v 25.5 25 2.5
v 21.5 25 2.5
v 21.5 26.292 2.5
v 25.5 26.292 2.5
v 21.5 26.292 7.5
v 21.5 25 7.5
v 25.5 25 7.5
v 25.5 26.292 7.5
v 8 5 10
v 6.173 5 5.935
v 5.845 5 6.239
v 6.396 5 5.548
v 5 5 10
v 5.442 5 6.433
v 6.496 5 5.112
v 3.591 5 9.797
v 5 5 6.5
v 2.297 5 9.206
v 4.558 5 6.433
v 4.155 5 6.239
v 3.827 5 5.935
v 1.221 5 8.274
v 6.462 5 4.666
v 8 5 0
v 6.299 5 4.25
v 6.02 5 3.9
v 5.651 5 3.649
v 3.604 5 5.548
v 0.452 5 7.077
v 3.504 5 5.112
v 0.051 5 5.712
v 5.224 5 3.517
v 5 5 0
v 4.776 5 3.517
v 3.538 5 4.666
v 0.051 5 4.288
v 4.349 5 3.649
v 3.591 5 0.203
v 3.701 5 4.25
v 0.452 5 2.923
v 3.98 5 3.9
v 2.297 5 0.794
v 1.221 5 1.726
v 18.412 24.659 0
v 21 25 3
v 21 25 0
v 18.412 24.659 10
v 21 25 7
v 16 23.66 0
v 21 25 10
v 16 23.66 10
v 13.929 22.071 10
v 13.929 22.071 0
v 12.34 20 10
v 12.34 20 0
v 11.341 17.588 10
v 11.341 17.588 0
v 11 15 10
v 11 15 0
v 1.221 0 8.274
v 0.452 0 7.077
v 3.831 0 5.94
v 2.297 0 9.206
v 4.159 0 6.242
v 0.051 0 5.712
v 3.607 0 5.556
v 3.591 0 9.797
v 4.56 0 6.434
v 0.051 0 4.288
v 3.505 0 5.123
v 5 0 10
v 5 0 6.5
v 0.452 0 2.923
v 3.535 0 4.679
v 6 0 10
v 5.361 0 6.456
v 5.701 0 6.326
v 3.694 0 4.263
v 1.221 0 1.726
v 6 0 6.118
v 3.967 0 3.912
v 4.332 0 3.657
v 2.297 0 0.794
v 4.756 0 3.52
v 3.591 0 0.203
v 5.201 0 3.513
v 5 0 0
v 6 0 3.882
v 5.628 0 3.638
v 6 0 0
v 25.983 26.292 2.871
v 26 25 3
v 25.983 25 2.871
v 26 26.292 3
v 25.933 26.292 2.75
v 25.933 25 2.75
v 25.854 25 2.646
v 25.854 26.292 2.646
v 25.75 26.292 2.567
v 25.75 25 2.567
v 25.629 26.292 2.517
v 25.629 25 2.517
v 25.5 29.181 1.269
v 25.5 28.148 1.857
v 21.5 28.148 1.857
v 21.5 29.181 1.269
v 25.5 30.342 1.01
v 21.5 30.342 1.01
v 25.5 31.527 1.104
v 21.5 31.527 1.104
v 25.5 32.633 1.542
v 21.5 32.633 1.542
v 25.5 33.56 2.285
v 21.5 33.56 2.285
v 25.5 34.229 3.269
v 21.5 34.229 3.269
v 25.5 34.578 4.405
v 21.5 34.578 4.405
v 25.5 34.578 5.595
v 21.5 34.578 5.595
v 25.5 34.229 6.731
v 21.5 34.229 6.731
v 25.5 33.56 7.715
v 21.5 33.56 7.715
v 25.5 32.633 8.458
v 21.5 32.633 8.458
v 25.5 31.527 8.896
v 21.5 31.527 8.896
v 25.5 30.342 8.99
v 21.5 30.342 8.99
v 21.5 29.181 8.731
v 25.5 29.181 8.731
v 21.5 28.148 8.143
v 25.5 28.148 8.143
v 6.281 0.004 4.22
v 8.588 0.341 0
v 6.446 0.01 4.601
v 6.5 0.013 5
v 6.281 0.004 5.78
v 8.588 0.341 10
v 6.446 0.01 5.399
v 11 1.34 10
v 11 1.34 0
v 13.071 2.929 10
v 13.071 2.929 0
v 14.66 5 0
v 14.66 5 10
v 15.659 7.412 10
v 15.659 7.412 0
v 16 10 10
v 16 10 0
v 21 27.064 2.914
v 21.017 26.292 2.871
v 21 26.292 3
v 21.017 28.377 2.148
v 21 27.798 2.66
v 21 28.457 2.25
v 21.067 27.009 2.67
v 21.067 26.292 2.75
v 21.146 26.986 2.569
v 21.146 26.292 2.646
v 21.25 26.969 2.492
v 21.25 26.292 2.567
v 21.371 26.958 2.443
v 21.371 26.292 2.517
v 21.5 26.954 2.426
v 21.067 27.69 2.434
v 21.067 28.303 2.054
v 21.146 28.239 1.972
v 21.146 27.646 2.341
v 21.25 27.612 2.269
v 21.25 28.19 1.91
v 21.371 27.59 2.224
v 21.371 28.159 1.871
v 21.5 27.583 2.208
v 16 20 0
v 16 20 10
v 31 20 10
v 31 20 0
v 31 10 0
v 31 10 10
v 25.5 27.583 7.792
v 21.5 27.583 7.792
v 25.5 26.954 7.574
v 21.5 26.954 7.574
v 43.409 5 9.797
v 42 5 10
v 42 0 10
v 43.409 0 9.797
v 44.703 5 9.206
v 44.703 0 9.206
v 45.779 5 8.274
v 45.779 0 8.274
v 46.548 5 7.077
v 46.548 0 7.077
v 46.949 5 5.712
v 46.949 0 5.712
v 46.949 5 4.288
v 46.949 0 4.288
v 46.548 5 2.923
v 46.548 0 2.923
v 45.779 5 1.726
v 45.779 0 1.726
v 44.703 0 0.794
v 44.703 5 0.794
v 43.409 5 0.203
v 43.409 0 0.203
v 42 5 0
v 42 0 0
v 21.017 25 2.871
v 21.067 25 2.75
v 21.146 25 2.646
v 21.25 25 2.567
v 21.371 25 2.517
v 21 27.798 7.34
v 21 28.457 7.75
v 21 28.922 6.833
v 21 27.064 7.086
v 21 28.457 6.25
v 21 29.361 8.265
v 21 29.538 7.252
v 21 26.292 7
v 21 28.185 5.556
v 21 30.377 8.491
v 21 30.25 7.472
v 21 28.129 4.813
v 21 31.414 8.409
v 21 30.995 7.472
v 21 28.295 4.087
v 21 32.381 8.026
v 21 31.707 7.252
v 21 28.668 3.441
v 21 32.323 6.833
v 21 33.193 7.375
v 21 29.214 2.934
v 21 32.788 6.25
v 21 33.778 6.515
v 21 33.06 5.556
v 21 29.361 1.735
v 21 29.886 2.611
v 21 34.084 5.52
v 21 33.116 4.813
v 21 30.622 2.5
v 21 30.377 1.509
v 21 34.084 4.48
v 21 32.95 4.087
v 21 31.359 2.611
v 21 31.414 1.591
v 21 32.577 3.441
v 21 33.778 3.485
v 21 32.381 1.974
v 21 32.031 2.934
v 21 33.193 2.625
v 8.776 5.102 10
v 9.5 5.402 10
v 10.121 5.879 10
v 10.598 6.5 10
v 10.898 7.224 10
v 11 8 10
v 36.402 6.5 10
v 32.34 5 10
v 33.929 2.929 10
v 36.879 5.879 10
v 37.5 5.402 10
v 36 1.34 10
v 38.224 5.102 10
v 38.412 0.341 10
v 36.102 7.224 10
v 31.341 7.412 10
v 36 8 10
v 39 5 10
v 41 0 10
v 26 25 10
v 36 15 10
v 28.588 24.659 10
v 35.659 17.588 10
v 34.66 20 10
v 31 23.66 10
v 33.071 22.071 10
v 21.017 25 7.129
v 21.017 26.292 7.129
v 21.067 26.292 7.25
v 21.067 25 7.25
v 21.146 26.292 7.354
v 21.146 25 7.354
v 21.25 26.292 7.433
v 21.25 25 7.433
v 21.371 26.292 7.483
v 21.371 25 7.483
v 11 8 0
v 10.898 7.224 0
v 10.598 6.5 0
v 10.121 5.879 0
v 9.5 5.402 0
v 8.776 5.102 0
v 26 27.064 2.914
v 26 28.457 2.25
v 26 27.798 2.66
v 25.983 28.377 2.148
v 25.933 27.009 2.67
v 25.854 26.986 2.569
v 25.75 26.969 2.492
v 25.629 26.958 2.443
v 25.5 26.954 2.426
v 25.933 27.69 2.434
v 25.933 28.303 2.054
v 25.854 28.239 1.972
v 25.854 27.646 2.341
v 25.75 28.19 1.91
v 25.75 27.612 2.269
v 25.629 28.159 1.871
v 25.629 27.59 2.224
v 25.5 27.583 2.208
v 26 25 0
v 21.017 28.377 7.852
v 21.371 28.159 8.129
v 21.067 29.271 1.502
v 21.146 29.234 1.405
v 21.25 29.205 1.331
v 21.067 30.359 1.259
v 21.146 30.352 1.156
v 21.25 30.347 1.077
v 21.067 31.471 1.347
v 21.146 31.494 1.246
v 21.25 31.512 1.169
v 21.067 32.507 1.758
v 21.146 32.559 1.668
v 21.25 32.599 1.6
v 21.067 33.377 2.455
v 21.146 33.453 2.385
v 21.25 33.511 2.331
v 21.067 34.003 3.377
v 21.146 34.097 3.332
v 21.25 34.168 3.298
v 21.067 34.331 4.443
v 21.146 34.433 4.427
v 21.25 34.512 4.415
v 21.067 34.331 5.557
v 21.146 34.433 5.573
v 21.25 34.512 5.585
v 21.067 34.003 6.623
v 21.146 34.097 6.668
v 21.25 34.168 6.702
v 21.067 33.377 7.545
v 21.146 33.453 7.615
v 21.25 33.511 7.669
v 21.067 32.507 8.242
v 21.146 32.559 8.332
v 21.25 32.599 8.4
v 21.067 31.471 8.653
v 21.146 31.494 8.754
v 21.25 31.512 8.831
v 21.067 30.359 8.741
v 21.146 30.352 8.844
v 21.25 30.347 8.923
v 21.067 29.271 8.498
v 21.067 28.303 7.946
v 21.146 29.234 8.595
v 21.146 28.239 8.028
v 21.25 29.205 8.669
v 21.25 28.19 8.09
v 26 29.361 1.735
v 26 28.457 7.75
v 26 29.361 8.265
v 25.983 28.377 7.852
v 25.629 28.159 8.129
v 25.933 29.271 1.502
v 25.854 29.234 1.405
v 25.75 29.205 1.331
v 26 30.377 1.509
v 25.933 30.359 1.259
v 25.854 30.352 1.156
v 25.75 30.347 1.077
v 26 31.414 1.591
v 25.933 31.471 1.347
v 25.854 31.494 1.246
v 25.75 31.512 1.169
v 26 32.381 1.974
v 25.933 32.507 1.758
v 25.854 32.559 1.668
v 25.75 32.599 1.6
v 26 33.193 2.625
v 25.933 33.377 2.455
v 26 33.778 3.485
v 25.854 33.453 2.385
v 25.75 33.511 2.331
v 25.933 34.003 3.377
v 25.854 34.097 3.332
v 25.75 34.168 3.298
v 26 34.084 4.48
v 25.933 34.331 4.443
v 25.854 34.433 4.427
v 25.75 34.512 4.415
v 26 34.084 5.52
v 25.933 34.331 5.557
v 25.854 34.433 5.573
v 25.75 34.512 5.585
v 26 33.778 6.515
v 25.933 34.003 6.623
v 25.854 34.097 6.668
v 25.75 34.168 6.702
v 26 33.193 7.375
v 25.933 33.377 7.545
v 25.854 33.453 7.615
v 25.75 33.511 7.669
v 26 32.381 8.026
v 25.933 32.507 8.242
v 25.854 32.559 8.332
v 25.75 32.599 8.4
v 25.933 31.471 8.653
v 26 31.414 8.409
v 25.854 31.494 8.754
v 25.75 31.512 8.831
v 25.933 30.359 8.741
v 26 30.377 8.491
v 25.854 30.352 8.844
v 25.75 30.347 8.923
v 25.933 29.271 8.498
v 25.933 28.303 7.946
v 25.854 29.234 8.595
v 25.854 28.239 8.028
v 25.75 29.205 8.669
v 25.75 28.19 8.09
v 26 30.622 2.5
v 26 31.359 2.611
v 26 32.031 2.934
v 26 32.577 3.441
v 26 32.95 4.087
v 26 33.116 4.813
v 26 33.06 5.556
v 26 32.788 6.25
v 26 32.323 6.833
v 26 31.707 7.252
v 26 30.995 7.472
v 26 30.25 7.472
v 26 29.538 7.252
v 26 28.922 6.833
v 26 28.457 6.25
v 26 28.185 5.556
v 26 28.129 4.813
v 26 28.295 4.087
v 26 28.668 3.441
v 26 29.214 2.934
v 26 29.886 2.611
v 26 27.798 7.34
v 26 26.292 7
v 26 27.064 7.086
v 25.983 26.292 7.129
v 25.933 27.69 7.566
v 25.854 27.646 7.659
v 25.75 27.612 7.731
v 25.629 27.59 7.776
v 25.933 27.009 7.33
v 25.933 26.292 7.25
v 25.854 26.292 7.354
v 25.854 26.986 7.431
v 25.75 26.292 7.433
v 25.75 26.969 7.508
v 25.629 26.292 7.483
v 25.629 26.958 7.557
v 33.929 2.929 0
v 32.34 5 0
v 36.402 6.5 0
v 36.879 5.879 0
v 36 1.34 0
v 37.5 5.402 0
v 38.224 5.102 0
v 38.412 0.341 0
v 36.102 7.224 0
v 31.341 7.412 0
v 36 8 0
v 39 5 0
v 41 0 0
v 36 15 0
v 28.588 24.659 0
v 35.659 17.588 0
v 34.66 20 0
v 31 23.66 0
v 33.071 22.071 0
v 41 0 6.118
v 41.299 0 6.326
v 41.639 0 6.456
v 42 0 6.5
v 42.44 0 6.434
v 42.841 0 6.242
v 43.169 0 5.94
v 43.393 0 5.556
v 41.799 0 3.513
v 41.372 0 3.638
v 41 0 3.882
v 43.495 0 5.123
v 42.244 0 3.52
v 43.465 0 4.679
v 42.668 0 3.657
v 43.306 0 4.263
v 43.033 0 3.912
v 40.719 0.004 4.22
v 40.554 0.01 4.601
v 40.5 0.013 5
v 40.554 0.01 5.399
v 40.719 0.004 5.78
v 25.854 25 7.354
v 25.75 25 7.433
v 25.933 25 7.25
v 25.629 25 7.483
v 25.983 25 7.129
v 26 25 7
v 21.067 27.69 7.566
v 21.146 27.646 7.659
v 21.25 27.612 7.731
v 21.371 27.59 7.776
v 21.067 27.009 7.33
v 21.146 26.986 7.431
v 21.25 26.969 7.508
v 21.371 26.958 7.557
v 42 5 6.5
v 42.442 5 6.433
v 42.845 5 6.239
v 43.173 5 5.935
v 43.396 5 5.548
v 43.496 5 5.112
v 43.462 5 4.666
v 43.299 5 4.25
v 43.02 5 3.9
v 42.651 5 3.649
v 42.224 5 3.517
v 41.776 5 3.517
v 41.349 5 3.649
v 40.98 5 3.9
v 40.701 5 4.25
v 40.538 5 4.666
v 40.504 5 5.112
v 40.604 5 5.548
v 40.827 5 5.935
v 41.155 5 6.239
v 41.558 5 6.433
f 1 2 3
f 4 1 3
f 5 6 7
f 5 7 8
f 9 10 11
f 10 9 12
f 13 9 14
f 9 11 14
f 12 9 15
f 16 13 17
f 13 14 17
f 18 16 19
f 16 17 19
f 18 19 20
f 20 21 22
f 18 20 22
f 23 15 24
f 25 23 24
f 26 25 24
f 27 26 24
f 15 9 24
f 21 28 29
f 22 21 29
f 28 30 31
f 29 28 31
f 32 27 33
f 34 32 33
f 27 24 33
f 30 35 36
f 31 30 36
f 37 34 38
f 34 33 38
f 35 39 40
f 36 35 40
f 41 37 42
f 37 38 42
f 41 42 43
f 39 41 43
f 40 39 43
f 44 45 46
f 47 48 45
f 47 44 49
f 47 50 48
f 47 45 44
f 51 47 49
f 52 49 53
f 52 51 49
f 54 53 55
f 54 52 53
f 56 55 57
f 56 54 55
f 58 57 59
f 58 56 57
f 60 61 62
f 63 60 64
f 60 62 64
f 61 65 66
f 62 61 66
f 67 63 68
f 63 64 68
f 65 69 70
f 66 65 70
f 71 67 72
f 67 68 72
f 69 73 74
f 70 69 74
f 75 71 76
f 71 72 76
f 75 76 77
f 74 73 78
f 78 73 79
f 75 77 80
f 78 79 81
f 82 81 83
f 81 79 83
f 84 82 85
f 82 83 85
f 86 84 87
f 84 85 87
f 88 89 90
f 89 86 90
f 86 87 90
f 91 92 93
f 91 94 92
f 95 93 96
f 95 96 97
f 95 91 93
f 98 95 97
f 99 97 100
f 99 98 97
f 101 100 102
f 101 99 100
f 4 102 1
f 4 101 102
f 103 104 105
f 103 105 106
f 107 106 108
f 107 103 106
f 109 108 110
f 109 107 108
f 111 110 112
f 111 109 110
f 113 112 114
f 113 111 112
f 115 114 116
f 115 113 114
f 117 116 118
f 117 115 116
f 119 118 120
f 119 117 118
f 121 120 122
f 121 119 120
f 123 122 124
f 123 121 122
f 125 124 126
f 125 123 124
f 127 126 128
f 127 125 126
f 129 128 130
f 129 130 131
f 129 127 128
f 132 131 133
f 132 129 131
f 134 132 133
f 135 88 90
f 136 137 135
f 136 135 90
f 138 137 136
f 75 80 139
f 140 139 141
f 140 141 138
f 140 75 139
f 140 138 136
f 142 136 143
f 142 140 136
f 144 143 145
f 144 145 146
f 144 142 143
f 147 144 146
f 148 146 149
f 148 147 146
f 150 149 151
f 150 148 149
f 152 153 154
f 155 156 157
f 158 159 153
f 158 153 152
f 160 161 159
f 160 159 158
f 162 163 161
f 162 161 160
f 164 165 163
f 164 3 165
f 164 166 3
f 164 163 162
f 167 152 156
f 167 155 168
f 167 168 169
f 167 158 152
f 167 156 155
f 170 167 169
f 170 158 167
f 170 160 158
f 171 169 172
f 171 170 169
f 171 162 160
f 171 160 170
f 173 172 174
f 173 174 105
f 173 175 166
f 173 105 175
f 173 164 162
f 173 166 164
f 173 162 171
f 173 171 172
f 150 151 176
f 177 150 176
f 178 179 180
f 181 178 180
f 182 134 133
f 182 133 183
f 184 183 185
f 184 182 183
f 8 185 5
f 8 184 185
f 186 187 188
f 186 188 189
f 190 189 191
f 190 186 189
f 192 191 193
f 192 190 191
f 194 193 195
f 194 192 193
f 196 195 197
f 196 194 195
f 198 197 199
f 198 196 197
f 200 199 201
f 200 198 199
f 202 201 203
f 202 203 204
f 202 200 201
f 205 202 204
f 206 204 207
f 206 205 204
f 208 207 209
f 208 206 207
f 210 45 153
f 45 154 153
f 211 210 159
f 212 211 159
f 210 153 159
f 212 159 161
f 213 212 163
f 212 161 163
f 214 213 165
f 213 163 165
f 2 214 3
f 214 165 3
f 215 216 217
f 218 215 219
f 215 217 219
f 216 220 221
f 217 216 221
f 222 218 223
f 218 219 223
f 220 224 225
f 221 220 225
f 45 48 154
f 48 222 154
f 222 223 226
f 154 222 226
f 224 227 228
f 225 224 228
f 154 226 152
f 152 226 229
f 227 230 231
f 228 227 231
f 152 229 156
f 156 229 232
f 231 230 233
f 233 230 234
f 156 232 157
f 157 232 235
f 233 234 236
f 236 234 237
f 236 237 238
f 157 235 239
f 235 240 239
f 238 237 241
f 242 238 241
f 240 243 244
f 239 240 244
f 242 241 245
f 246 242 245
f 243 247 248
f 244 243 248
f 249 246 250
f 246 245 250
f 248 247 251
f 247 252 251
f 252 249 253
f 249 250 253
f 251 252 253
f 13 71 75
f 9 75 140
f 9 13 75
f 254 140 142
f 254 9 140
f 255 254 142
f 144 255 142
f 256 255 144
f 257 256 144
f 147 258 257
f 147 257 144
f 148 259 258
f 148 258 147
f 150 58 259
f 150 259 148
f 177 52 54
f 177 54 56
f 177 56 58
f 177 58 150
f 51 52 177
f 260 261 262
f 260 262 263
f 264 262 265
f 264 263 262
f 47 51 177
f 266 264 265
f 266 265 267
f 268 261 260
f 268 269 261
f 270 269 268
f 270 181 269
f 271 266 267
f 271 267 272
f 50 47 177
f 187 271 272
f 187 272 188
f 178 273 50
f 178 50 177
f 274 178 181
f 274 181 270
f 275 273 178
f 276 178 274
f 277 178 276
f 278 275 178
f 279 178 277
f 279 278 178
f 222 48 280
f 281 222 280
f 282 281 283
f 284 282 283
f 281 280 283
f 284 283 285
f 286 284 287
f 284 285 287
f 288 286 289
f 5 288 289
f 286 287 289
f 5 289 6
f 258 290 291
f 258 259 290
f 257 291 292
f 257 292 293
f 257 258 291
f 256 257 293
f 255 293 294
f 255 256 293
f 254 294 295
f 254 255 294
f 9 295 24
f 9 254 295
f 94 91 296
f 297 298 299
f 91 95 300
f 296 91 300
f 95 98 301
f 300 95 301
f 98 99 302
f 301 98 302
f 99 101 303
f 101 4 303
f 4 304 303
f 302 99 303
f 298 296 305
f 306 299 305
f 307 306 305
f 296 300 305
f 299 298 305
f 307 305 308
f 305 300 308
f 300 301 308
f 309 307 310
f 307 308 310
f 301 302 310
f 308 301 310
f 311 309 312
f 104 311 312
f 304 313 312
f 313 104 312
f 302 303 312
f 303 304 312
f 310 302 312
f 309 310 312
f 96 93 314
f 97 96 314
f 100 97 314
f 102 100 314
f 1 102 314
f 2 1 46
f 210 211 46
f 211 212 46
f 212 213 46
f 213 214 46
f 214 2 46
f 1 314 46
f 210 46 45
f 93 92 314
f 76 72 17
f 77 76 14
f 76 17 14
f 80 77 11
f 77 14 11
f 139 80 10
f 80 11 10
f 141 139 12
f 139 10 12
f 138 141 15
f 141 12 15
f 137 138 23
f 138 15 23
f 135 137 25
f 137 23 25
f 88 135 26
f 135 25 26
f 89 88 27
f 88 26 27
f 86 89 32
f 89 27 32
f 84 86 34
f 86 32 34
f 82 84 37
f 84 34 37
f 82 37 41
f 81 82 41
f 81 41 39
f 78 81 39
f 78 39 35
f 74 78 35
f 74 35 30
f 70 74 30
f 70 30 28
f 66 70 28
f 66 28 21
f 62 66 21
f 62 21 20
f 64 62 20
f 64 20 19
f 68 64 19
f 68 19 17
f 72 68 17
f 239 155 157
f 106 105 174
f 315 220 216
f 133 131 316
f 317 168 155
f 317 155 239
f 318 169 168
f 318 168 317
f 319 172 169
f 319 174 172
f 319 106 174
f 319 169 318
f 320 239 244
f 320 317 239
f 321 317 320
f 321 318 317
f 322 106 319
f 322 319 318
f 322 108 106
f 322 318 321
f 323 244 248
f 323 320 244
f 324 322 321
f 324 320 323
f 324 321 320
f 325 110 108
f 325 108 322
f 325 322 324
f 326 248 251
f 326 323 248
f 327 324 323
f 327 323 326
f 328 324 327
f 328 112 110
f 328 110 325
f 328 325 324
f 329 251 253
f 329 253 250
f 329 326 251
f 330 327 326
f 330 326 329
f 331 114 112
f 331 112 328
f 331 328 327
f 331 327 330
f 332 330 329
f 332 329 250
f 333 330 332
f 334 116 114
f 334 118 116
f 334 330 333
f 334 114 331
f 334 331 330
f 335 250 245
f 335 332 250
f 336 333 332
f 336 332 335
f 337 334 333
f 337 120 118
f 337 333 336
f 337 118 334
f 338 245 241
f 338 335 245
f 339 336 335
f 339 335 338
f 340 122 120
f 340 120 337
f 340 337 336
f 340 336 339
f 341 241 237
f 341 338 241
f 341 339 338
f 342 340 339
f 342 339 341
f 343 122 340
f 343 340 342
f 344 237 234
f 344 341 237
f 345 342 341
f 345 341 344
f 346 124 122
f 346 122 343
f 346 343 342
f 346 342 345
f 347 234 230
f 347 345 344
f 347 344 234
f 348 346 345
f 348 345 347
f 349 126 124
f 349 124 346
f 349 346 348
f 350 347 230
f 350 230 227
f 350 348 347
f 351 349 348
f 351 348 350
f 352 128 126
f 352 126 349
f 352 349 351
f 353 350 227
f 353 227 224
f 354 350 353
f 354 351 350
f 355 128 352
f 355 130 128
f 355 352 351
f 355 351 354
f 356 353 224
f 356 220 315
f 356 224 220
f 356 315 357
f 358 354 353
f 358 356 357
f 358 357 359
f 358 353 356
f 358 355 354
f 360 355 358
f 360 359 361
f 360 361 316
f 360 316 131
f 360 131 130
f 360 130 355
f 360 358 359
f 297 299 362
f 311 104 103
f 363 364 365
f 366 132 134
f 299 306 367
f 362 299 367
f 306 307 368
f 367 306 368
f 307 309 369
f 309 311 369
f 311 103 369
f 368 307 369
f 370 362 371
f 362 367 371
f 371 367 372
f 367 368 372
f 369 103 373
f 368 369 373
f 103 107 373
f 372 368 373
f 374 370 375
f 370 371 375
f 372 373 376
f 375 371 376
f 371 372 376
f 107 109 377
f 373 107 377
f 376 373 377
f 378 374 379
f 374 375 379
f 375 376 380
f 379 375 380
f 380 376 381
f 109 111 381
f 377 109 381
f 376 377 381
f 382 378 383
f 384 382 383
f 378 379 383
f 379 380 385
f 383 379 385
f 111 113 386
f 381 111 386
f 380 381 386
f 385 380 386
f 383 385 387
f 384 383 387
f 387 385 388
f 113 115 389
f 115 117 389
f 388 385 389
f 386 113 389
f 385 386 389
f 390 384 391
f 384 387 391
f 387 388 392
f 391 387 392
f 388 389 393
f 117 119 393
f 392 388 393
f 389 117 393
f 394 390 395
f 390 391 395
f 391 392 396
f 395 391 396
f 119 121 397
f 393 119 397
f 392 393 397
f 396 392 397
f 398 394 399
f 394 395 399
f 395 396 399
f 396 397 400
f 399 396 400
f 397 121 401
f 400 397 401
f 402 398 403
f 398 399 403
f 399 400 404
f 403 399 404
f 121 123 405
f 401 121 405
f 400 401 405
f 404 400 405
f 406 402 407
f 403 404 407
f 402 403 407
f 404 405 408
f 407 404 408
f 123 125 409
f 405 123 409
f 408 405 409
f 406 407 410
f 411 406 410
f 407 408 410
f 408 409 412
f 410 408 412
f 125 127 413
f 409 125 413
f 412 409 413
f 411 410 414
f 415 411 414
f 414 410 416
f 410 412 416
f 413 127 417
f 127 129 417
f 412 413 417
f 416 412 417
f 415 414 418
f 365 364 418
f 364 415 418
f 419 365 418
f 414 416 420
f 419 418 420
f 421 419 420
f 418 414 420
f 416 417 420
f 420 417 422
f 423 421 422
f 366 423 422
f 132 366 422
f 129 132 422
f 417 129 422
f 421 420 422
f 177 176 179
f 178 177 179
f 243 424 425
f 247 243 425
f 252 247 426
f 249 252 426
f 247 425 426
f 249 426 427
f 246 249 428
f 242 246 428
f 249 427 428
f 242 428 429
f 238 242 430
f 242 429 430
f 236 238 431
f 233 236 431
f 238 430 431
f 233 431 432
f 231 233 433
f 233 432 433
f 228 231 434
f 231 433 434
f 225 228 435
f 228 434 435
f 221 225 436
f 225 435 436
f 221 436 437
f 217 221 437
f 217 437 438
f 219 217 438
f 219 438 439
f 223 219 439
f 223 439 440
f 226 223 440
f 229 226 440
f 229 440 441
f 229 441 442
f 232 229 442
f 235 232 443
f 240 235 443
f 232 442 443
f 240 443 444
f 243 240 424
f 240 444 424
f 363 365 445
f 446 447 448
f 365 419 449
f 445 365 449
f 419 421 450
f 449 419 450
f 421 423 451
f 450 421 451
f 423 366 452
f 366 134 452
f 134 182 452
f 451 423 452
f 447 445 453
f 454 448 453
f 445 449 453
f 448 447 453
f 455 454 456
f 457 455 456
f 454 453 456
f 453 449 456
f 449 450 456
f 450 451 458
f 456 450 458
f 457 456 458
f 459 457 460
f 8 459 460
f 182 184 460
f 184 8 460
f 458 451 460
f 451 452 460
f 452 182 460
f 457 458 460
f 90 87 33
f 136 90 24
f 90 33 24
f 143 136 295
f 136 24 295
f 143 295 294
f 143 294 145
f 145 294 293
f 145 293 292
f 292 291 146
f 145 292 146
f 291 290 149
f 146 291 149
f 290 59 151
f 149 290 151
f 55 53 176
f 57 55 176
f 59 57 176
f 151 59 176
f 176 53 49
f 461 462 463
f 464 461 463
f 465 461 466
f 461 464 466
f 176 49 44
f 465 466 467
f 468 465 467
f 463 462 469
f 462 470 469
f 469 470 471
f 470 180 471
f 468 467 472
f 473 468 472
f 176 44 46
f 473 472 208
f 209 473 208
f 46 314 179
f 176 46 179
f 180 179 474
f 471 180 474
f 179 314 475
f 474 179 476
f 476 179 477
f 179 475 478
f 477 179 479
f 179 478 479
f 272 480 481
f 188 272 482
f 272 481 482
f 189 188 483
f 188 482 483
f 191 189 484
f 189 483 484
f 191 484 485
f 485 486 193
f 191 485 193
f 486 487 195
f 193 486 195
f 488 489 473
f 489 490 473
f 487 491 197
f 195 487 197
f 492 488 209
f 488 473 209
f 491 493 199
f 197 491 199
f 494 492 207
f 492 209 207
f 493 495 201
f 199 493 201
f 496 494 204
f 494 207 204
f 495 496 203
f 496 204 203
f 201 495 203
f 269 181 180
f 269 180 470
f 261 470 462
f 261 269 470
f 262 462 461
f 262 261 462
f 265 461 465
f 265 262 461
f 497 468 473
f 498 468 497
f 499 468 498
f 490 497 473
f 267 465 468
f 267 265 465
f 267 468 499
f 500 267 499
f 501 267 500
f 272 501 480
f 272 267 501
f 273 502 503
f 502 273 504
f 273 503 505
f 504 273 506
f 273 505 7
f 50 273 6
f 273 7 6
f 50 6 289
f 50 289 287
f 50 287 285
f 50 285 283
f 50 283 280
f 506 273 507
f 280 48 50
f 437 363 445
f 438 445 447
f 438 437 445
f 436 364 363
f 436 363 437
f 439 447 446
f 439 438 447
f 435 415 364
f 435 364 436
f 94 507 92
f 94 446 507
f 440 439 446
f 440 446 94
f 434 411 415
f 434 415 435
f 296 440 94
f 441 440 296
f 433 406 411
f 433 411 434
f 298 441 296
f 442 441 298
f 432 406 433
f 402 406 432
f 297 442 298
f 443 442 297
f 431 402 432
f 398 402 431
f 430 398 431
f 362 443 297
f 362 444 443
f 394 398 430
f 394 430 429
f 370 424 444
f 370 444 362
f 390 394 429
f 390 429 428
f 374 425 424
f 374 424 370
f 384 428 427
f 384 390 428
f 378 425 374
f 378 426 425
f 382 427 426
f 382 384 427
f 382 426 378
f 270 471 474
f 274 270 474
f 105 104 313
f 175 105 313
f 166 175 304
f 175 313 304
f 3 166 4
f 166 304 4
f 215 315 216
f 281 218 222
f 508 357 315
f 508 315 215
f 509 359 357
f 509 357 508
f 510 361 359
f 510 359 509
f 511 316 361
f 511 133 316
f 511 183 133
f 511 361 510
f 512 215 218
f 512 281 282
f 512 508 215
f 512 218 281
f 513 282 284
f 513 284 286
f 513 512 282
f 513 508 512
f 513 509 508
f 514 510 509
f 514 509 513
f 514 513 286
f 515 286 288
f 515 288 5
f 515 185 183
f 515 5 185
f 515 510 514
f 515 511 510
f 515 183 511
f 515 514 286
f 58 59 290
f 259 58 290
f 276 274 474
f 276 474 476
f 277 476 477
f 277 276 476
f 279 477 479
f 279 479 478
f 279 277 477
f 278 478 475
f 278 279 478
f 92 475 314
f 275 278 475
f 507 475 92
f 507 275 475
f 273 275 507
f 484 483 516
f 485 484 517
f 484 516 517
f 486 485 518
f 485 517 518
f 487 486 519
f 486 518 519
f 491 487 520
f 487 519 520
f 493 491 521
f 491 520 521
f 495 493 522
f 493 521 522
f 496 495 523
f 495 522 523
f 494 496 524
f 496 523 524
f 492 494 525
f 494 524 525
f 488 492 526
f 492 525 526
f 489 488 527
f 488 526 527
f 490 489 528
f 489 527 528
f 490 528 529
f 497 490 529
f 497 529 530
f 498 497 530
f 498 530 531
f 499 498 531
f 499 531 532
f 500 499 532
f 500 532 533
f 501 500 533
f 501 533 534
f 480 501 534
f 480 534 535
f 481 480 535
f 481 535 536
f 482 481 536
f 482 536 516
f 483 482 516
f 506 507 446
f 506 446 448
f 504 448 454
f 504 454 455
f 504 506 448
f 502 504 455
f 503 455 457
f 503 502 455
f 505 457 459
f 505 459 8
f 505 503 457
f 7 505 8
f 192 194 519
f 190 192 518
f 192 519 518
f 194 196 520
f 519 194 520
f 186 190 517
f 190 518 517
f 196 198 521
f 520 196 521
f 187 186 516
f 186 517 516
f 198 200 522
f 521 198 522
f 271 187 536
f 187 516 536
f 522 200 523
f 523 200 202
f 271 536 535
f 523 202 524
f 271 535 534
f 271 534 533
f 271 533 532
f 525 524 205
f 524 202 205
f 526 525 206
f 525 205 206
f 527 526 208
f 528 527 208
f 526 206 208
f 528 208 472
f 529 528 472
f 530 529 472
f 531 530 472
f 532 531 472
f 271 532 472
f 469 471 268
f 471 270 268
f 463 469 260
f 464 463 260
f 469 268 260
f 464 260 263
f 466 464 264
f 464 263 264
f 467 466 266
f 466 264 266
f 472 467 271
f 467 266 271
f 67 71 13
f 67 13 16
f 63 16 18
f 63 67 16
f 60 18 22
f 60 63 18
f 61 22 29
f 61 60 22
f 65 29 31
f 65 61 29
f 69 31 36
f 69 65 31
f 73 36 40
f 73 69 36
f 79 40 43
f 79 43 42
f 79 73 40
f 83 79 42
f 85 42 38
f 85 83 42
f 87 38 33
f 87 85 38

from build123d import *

# Parameters (mm, degrees)
BOSS_EXTRU_1_DEPTH      = 10
CONG_1_RADIUS           = 5
CONG_1_LENGTH           = 5
CONG_2_RADIUS           = 5
CONG_2_LENGTH           = 5
CONG_3_R                = 10
CONG_4_R                = 10
CONG_6_R                = 3
CONG_7_R                = 3
ESQUISSE2_R             = 1.5
ENL_V_MAT_EXTRU_1_DEPTH = 10
BOSS_EXTRU_2_START      = 21
ESQUISSE3_W             = 5
ESQUISSE3_H             = 2.5
BOSS_EXTRU_2_DEPTH      = 5
ESQUISSE5_R             = 2.5
BOSS_EXTRU_3_DEPTH      = 5
CONG_8_R                = 3
CONG_9_R                = 3
CONG_14_R               = 0.5


with BuildPart() as part:
    # Esquisse1 → Boss.-Extru.1 (new body)
    with BuildSketch(Plane.XY):
        Polygon((0, 0), (16, 0), (16, 20), (31, 20), (31, 0), (47, 0), (47, 5), (36, 5), (36, 25), (11, 25), (11, 5), (0, 5), align=None)
    extrude(amount=BOSS_EXTRU_1_DEPTH)

    # Congé1: full round fillet: the end face becomes a half cylinder, R = half its width
    cong_1_face = Plane((0, 2.5, 5), x_dir=(0, -1, 0), z_dir=(-1, 0, 0))  # on the end face: x along it, z out of the body
    cong_1_slab = cong_1_face.offset(-CONG_1_RADIUS / 2) * Box(CONG_1_LENGTH, 2 * CONG_1_RADIUS, CONG_1_RADIUS, mode=Mode.PRIVATE)  # the body's end, R deep
    cong_1_round = Plane((5, 2.5, 5), x_dir=(-1, 0, 0), z_dir=(0, -1, 0)) * Cylinder(CONG_1_RADIUS, CONG_1_LENGTH, mode=Mode.PRIVATE)  # its axis R under the face
    add(cong_1_slab - cong_1_round, mode=Mode.SUBTRACT)

    # Congé2: full round fillet: the end face becomes a half cylinder, R = half its width
    cong_2_face = Plane((47, 2.5, 5), x_dir=(0, 1, 0), z_dir=(1, 0, 0))  # on the end face: x along it, z out of the body
    cong_2_slab = cong_2_face.offset(-CONG_2_RADIUS / 2) * Box(CONG_2_LENGTH, 2 * CONG_2_RADIUS, CONG_2_RADIUS, mode=Mode.PRIVATE)  # the body's end, R deep
    cong_2_round = Plane((42, 2.5, 5), x_dir=(1, 0, 0), z_dir=(0, 1, 0)) * Cylinder(CONG_2_RADIUS, CONG_2_LENGTH, mode=Mode.PRIVATE)  # its axis R under the face
    add(cong_2_slab - cong_2_round, mode=Mode.SUBTRACT)

    # Congé3
    cong_3_edges = [part.edges().sort_by_distance(p)[0] for p in [
        (31, 0, 5),
        (16, 0, 5),
    ]]
    fillet(cong_3_edges, radius=CONG_3_R)

    # Congé4
    cong_4_edges = [part.edges().sort_by_distance(p)[0] for p in [
        (11, 25, 5),
        (36, 25, 5),
    ]]
    fillet(cong_4_edges, radius=CONG_4_R)

    # Congé6
    cong_6_edges = [part.edges().sort_by_distance(p)[0] for p in [
        (11, 5, 5),
    ]]
    fillet(cong_6_edges, radius=CONG_6_R)

    # Congé7
    cong_7_edges = [part.edges().sort_by_distance(p)[0] for p in [
        (36, 5, 5),
    ]]
    fillet(cong_7_edges, radius=CONG_7_R)

    # Esquisse2 → Enlèv. mat.-Extru.1 (cut)
    with BuildSketch(Plane(origin=(0, 5, 0), x_dir=(1, 0, 0), z_dir=(0, 1, 0))):
        with Locations(Location((5, -5, 0), (0, 0, 270))):
            Circle(ESQUISSE2_R)
        with Locations(Location((42, -5, 0), (0, 0, 270))):
            Circle(ESQUISSE2_R)
    extrude(amount=-ENL_V_MAT_EXTRU_1_DEPTH, mode=Mode.SUBTRACT)

    # Esquisse3 → Boss.-Extru.2 (add)
    with BuildSketch(Plane(origin=(0, 0, 0), x_dir=(0, 0, -1), z_dir=(1, 0, 0)).offset(BOSS_EXTRU_2_START)):
        with Locations((-5, 26.25)):
            Rectangle(ESQUISSE3_W, ESQUISSE3_H)
    extrude(amount=BOSS_EXTRU_2_DEPTH)

    # Esquisse5 → Boss.-Extru.3 (add)
    with BuildSketch(Plane(origin=(26, 0, 0), x_dir=(0, 0, -1), z_dir=(1, 0, 0))):
        with BuildLine():
            Line((-7.5, 27.5), (-2.5, 27.5))
            ThreePointArc((-2.5, 27.5), (-5, 34.622498999), (-7.5, 27.5))
        make_face()
        with Locations((-5, 30.622498999)):
            Circle(ESQUISSE5_R, mode=Mode.SUBTRACT)
    extrude(amount=-BOSS_EXTRU_3_DEPTH)

    # Congé8
    cong_8_edges = [part.edges().sort_by_distance(p)[0] for p in [
        (23.5, 27.5, 7.5),
    ]]
    fillet(cong_8_edges, radius=CONG_8_R)

    # Congé9
    cong_9_edges = [part.edges().sort_by_distance(p)[0] for p in [
        (23.5, 27.5, 2.5),
    ]]
    fillet(cong_9_edges, radius=CONG_9_R)

    # Congé14
    cong_14_edges = [part.edges().sort_by_distance(p)[0] for p in [
        (21, 25.64618599, 2.5),
        (26, 25.64618599, 2.5),
        (21, 25.64618599, 7.5),
        (26, 25.64618599, 7.5),
        (26, 27.274352486, 7.665266452),
        (21, 27.274352486, 7.665266452),
        (21, 34.622498999, 5),
        (26, 34.622498999, 5),
        (21, 27.274352486, 2.334733548),
        (26, 27.274352486, 2.334733548),
    ]]
    fillet(cong_14_edges, radius=CONG_14_R)


solid = part.part
